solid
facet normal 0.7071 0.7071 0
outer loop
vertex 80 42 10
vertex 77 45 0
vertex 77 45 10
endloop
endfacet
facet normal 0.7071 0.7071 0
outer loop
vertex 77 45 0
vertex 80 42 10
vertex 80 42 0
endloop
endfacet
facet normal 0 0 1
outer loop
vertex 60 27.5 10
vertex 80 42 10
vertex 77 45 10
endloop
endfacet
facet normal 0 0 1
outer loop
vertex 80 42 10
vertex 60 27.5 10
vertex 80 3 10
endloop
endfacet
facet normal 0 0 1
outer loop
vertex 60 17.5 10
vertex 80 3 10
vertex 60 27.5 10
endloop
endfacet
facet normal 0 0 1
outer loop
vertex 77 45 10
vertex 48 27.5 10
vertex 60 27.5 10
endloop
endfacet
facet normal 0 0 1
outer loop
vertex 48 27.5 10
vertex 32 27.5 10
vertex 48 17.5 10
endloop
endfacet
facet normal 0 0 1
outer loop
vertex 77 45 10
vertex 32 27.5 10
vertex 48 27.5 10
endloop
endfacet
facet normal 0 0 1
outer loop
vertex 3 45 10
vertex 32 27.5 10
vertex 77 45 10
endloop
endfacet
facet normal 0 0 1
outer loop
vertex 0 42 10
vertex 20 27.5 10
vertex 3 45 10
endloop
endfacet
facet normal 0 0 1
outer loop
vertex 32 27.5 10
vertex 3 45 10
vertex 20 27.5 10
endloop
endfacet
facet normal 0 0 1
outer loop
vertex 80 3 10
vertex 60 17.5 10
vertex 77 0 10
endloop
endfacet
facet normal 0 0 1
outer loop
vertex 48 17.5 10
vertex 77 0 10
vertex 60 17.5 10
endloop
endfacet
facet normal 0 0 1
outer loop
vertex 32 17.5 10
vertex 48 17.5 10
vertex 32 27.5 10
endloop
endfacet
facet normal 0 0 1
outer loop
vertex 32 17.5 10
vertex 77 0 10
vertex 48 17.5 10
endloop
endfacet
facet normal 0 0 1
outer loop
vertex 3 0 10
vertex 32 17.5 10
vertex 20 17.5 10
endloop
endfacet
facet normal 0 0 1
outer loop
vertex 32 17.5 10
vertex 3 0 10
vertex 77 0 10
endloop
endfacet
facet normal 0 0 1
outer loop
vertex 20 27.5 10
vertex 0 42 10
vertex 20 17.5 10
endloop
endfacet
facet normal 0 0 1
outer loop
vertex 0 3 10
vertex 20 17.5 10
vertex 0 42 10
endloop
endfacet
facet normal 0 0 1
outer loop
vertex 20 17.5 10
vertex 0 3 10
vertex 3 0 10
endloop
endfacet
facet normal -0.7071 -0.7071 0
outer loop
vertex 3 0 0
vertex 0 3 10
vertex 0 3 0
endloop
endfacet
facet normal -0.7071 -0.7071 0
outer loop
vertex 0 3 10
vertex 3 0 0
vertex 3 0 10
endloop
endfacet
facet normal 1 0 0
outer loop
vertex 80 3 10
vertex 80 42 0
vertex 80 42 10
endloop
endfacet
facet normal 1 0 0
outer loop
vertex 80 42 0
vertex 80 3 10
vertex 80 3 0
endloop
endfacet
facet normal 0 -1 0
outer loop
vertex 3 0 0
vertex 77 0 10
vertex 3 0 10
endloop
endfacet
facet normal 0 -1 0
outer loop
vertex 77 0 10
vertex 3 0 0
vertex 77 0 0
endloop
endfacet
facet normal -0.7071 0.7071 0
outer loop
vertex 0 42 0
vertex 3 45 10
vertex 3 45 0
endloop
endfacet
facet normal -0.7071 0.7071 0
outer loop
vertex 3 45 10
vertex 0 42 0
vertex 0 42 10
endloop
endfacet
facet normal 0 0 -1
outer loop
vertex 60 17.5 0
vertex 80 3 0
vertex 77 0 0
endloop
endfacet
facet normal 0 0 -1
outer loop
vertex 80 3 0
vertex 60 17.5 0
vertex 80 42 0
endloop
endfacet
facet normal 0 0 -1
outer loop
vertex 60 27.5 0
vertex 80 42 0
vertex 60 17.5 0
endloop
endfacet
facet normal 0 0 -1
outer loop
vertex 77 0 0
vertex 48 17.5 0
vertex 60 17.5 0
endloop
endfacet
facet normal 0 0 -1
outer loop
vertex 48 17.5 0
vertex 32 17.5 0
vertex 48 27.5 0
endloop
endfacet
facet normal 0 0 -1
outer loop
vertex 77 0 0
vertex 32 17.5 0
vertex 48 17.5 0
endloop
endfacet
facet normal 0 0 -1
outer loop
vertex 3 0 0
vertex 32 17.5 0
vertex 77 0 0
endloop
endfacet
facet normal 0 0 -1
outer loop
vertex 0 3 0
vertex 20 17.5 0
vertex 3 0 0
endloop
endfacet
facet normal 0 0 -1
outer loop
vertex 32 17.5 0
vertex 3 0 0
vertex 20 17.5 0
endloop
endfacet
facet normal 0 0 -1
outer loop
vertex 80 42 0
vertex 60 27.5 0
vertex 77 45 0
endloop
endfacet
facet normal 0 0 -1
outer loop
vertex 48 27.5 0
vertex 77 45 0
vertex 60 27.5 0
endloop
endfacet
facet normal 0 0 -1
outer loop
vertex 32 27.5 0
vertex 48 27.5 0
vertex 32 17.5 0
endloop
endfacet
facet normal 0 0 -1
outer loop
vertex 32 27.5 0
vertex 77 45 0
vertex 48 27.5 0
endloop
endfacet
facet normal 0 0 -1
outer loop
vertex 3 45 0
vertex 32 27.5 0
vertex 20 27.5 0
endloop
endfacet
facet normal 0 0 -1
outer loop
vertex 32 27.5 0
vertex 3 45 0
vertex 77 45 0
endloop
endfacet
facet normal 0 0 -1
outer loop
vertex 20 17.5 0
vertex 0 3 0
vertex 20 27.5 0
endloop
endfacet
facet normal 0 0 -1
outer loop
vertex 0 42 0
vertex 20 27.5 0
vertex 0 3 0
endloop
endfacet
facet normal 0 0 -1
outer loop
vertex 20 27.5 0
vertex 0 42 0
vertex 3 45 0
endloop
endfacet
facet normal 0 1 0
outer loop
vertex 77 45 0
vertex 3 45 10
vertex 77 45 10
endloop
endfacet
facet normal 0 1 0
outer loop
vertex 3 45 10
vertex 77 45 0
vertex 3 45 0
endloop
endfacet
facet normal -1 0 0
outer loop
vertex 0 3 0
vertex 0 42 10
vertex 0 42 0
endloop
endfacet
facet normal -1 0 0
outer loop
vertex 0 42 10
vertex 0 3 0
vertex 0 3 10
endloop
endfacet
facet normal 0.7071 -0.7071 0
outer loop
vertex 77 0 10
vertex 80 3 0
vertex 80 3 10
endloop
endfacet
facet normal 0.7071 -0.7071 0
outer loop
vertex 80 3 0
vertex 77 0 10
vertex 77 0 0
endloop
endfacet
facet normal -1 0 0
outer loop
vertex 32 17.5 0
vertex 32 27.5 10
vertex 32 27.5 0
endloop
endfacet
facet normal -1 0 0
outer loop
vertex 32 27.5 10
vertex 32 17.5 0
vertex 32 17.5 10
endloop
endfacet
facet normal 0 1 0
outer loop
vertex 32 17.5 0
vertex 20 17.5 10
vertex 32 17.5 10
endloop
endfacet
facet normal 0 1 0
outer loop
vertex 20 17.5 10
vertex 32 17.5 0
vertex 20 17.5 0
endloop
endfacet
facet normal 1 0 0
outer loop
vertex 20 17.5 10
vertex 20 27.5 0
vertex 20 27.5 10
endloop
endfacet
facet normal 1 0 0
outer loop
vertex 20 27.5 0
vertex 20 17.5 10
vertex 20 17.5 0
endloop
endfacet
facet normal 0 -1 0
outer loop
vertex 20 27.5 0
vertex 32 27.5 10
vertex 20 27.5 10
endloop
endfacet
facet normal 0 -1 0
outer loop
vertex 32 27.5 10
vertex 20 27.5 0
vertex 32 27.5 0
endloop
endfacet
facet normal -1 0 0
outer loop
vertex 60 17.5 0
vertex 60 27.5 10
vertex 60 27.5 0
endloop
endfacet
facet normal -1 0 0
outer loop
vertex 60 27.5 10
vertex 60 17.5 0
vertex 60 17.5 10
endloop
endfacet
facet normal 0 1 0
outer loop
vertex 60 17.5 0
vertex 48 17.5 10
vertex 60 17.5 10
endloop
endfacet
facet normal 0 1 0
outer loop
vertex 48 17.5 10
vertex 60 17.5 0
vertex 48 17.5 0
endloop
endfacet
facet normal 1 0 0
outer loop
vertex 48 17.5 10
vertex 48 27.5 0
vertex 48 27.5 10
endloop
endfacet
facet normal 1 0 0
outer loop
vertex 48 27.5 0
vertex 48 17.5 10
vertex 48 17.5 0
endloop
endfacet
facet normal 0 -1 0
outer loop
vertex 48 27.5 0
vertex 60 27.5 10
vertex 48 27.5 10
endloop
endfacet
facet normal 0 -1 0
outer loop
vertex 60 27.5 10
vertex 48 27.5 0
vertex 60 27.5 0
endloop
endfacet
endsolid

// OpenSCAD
$fn = 32;

// ----------------------------------------------------------------------
// Windowed plate: 2 voids, 80 x 45 x 10 mm
// ----------------------------------------------------------------------

// --- parameters (mm) ---
plate_l = 80;             // plate length, X
plate_w = 45;             // plate width, Y
plate_t = 10;             // plate thickness, Z
edge_margin = 12;         // wall from the plate edge to any window
windows = 2;              // number of windows in the row
win_l = 12;               // window length
win_w = 10;               // window width
win_pitch = 28;           // window pitch along X
depth_1 = 10;             // depth of void 1 (full thickness = through)
depth_2 = 10;             // depth of void 2 (full thickness = through)
corner_c = 3;             // corner chamfer of the plate

profile = [[3, 0], [77, 0], [80, 3], [80, 42], [77, 45], [3, 45], [0, 42], [0, 3]];  // primary outline, 8 points, counter clockwise
void_1 = [[20, 17.5], [32, 17.5], [32, 27.5], [20, 27.5]];  // window 1 of the row, 4 points
void_2 = [[48, 17.5], [60, 17.5], [60, 27.5], [48, 27.5]];  // window 2 of the row, 4 points

// --- the one profile operation ---
difference() {
  linear_extrude(height = plate_t) polygon(points = profile);
  translate([0, 0, -1])
    linear_extrude(height = plate_t + 2) polygon(points = void_1);
  translate([0, 0, -1])
    linear_extrude(height = plate_t + 2) polygon(points = void_2);
}
